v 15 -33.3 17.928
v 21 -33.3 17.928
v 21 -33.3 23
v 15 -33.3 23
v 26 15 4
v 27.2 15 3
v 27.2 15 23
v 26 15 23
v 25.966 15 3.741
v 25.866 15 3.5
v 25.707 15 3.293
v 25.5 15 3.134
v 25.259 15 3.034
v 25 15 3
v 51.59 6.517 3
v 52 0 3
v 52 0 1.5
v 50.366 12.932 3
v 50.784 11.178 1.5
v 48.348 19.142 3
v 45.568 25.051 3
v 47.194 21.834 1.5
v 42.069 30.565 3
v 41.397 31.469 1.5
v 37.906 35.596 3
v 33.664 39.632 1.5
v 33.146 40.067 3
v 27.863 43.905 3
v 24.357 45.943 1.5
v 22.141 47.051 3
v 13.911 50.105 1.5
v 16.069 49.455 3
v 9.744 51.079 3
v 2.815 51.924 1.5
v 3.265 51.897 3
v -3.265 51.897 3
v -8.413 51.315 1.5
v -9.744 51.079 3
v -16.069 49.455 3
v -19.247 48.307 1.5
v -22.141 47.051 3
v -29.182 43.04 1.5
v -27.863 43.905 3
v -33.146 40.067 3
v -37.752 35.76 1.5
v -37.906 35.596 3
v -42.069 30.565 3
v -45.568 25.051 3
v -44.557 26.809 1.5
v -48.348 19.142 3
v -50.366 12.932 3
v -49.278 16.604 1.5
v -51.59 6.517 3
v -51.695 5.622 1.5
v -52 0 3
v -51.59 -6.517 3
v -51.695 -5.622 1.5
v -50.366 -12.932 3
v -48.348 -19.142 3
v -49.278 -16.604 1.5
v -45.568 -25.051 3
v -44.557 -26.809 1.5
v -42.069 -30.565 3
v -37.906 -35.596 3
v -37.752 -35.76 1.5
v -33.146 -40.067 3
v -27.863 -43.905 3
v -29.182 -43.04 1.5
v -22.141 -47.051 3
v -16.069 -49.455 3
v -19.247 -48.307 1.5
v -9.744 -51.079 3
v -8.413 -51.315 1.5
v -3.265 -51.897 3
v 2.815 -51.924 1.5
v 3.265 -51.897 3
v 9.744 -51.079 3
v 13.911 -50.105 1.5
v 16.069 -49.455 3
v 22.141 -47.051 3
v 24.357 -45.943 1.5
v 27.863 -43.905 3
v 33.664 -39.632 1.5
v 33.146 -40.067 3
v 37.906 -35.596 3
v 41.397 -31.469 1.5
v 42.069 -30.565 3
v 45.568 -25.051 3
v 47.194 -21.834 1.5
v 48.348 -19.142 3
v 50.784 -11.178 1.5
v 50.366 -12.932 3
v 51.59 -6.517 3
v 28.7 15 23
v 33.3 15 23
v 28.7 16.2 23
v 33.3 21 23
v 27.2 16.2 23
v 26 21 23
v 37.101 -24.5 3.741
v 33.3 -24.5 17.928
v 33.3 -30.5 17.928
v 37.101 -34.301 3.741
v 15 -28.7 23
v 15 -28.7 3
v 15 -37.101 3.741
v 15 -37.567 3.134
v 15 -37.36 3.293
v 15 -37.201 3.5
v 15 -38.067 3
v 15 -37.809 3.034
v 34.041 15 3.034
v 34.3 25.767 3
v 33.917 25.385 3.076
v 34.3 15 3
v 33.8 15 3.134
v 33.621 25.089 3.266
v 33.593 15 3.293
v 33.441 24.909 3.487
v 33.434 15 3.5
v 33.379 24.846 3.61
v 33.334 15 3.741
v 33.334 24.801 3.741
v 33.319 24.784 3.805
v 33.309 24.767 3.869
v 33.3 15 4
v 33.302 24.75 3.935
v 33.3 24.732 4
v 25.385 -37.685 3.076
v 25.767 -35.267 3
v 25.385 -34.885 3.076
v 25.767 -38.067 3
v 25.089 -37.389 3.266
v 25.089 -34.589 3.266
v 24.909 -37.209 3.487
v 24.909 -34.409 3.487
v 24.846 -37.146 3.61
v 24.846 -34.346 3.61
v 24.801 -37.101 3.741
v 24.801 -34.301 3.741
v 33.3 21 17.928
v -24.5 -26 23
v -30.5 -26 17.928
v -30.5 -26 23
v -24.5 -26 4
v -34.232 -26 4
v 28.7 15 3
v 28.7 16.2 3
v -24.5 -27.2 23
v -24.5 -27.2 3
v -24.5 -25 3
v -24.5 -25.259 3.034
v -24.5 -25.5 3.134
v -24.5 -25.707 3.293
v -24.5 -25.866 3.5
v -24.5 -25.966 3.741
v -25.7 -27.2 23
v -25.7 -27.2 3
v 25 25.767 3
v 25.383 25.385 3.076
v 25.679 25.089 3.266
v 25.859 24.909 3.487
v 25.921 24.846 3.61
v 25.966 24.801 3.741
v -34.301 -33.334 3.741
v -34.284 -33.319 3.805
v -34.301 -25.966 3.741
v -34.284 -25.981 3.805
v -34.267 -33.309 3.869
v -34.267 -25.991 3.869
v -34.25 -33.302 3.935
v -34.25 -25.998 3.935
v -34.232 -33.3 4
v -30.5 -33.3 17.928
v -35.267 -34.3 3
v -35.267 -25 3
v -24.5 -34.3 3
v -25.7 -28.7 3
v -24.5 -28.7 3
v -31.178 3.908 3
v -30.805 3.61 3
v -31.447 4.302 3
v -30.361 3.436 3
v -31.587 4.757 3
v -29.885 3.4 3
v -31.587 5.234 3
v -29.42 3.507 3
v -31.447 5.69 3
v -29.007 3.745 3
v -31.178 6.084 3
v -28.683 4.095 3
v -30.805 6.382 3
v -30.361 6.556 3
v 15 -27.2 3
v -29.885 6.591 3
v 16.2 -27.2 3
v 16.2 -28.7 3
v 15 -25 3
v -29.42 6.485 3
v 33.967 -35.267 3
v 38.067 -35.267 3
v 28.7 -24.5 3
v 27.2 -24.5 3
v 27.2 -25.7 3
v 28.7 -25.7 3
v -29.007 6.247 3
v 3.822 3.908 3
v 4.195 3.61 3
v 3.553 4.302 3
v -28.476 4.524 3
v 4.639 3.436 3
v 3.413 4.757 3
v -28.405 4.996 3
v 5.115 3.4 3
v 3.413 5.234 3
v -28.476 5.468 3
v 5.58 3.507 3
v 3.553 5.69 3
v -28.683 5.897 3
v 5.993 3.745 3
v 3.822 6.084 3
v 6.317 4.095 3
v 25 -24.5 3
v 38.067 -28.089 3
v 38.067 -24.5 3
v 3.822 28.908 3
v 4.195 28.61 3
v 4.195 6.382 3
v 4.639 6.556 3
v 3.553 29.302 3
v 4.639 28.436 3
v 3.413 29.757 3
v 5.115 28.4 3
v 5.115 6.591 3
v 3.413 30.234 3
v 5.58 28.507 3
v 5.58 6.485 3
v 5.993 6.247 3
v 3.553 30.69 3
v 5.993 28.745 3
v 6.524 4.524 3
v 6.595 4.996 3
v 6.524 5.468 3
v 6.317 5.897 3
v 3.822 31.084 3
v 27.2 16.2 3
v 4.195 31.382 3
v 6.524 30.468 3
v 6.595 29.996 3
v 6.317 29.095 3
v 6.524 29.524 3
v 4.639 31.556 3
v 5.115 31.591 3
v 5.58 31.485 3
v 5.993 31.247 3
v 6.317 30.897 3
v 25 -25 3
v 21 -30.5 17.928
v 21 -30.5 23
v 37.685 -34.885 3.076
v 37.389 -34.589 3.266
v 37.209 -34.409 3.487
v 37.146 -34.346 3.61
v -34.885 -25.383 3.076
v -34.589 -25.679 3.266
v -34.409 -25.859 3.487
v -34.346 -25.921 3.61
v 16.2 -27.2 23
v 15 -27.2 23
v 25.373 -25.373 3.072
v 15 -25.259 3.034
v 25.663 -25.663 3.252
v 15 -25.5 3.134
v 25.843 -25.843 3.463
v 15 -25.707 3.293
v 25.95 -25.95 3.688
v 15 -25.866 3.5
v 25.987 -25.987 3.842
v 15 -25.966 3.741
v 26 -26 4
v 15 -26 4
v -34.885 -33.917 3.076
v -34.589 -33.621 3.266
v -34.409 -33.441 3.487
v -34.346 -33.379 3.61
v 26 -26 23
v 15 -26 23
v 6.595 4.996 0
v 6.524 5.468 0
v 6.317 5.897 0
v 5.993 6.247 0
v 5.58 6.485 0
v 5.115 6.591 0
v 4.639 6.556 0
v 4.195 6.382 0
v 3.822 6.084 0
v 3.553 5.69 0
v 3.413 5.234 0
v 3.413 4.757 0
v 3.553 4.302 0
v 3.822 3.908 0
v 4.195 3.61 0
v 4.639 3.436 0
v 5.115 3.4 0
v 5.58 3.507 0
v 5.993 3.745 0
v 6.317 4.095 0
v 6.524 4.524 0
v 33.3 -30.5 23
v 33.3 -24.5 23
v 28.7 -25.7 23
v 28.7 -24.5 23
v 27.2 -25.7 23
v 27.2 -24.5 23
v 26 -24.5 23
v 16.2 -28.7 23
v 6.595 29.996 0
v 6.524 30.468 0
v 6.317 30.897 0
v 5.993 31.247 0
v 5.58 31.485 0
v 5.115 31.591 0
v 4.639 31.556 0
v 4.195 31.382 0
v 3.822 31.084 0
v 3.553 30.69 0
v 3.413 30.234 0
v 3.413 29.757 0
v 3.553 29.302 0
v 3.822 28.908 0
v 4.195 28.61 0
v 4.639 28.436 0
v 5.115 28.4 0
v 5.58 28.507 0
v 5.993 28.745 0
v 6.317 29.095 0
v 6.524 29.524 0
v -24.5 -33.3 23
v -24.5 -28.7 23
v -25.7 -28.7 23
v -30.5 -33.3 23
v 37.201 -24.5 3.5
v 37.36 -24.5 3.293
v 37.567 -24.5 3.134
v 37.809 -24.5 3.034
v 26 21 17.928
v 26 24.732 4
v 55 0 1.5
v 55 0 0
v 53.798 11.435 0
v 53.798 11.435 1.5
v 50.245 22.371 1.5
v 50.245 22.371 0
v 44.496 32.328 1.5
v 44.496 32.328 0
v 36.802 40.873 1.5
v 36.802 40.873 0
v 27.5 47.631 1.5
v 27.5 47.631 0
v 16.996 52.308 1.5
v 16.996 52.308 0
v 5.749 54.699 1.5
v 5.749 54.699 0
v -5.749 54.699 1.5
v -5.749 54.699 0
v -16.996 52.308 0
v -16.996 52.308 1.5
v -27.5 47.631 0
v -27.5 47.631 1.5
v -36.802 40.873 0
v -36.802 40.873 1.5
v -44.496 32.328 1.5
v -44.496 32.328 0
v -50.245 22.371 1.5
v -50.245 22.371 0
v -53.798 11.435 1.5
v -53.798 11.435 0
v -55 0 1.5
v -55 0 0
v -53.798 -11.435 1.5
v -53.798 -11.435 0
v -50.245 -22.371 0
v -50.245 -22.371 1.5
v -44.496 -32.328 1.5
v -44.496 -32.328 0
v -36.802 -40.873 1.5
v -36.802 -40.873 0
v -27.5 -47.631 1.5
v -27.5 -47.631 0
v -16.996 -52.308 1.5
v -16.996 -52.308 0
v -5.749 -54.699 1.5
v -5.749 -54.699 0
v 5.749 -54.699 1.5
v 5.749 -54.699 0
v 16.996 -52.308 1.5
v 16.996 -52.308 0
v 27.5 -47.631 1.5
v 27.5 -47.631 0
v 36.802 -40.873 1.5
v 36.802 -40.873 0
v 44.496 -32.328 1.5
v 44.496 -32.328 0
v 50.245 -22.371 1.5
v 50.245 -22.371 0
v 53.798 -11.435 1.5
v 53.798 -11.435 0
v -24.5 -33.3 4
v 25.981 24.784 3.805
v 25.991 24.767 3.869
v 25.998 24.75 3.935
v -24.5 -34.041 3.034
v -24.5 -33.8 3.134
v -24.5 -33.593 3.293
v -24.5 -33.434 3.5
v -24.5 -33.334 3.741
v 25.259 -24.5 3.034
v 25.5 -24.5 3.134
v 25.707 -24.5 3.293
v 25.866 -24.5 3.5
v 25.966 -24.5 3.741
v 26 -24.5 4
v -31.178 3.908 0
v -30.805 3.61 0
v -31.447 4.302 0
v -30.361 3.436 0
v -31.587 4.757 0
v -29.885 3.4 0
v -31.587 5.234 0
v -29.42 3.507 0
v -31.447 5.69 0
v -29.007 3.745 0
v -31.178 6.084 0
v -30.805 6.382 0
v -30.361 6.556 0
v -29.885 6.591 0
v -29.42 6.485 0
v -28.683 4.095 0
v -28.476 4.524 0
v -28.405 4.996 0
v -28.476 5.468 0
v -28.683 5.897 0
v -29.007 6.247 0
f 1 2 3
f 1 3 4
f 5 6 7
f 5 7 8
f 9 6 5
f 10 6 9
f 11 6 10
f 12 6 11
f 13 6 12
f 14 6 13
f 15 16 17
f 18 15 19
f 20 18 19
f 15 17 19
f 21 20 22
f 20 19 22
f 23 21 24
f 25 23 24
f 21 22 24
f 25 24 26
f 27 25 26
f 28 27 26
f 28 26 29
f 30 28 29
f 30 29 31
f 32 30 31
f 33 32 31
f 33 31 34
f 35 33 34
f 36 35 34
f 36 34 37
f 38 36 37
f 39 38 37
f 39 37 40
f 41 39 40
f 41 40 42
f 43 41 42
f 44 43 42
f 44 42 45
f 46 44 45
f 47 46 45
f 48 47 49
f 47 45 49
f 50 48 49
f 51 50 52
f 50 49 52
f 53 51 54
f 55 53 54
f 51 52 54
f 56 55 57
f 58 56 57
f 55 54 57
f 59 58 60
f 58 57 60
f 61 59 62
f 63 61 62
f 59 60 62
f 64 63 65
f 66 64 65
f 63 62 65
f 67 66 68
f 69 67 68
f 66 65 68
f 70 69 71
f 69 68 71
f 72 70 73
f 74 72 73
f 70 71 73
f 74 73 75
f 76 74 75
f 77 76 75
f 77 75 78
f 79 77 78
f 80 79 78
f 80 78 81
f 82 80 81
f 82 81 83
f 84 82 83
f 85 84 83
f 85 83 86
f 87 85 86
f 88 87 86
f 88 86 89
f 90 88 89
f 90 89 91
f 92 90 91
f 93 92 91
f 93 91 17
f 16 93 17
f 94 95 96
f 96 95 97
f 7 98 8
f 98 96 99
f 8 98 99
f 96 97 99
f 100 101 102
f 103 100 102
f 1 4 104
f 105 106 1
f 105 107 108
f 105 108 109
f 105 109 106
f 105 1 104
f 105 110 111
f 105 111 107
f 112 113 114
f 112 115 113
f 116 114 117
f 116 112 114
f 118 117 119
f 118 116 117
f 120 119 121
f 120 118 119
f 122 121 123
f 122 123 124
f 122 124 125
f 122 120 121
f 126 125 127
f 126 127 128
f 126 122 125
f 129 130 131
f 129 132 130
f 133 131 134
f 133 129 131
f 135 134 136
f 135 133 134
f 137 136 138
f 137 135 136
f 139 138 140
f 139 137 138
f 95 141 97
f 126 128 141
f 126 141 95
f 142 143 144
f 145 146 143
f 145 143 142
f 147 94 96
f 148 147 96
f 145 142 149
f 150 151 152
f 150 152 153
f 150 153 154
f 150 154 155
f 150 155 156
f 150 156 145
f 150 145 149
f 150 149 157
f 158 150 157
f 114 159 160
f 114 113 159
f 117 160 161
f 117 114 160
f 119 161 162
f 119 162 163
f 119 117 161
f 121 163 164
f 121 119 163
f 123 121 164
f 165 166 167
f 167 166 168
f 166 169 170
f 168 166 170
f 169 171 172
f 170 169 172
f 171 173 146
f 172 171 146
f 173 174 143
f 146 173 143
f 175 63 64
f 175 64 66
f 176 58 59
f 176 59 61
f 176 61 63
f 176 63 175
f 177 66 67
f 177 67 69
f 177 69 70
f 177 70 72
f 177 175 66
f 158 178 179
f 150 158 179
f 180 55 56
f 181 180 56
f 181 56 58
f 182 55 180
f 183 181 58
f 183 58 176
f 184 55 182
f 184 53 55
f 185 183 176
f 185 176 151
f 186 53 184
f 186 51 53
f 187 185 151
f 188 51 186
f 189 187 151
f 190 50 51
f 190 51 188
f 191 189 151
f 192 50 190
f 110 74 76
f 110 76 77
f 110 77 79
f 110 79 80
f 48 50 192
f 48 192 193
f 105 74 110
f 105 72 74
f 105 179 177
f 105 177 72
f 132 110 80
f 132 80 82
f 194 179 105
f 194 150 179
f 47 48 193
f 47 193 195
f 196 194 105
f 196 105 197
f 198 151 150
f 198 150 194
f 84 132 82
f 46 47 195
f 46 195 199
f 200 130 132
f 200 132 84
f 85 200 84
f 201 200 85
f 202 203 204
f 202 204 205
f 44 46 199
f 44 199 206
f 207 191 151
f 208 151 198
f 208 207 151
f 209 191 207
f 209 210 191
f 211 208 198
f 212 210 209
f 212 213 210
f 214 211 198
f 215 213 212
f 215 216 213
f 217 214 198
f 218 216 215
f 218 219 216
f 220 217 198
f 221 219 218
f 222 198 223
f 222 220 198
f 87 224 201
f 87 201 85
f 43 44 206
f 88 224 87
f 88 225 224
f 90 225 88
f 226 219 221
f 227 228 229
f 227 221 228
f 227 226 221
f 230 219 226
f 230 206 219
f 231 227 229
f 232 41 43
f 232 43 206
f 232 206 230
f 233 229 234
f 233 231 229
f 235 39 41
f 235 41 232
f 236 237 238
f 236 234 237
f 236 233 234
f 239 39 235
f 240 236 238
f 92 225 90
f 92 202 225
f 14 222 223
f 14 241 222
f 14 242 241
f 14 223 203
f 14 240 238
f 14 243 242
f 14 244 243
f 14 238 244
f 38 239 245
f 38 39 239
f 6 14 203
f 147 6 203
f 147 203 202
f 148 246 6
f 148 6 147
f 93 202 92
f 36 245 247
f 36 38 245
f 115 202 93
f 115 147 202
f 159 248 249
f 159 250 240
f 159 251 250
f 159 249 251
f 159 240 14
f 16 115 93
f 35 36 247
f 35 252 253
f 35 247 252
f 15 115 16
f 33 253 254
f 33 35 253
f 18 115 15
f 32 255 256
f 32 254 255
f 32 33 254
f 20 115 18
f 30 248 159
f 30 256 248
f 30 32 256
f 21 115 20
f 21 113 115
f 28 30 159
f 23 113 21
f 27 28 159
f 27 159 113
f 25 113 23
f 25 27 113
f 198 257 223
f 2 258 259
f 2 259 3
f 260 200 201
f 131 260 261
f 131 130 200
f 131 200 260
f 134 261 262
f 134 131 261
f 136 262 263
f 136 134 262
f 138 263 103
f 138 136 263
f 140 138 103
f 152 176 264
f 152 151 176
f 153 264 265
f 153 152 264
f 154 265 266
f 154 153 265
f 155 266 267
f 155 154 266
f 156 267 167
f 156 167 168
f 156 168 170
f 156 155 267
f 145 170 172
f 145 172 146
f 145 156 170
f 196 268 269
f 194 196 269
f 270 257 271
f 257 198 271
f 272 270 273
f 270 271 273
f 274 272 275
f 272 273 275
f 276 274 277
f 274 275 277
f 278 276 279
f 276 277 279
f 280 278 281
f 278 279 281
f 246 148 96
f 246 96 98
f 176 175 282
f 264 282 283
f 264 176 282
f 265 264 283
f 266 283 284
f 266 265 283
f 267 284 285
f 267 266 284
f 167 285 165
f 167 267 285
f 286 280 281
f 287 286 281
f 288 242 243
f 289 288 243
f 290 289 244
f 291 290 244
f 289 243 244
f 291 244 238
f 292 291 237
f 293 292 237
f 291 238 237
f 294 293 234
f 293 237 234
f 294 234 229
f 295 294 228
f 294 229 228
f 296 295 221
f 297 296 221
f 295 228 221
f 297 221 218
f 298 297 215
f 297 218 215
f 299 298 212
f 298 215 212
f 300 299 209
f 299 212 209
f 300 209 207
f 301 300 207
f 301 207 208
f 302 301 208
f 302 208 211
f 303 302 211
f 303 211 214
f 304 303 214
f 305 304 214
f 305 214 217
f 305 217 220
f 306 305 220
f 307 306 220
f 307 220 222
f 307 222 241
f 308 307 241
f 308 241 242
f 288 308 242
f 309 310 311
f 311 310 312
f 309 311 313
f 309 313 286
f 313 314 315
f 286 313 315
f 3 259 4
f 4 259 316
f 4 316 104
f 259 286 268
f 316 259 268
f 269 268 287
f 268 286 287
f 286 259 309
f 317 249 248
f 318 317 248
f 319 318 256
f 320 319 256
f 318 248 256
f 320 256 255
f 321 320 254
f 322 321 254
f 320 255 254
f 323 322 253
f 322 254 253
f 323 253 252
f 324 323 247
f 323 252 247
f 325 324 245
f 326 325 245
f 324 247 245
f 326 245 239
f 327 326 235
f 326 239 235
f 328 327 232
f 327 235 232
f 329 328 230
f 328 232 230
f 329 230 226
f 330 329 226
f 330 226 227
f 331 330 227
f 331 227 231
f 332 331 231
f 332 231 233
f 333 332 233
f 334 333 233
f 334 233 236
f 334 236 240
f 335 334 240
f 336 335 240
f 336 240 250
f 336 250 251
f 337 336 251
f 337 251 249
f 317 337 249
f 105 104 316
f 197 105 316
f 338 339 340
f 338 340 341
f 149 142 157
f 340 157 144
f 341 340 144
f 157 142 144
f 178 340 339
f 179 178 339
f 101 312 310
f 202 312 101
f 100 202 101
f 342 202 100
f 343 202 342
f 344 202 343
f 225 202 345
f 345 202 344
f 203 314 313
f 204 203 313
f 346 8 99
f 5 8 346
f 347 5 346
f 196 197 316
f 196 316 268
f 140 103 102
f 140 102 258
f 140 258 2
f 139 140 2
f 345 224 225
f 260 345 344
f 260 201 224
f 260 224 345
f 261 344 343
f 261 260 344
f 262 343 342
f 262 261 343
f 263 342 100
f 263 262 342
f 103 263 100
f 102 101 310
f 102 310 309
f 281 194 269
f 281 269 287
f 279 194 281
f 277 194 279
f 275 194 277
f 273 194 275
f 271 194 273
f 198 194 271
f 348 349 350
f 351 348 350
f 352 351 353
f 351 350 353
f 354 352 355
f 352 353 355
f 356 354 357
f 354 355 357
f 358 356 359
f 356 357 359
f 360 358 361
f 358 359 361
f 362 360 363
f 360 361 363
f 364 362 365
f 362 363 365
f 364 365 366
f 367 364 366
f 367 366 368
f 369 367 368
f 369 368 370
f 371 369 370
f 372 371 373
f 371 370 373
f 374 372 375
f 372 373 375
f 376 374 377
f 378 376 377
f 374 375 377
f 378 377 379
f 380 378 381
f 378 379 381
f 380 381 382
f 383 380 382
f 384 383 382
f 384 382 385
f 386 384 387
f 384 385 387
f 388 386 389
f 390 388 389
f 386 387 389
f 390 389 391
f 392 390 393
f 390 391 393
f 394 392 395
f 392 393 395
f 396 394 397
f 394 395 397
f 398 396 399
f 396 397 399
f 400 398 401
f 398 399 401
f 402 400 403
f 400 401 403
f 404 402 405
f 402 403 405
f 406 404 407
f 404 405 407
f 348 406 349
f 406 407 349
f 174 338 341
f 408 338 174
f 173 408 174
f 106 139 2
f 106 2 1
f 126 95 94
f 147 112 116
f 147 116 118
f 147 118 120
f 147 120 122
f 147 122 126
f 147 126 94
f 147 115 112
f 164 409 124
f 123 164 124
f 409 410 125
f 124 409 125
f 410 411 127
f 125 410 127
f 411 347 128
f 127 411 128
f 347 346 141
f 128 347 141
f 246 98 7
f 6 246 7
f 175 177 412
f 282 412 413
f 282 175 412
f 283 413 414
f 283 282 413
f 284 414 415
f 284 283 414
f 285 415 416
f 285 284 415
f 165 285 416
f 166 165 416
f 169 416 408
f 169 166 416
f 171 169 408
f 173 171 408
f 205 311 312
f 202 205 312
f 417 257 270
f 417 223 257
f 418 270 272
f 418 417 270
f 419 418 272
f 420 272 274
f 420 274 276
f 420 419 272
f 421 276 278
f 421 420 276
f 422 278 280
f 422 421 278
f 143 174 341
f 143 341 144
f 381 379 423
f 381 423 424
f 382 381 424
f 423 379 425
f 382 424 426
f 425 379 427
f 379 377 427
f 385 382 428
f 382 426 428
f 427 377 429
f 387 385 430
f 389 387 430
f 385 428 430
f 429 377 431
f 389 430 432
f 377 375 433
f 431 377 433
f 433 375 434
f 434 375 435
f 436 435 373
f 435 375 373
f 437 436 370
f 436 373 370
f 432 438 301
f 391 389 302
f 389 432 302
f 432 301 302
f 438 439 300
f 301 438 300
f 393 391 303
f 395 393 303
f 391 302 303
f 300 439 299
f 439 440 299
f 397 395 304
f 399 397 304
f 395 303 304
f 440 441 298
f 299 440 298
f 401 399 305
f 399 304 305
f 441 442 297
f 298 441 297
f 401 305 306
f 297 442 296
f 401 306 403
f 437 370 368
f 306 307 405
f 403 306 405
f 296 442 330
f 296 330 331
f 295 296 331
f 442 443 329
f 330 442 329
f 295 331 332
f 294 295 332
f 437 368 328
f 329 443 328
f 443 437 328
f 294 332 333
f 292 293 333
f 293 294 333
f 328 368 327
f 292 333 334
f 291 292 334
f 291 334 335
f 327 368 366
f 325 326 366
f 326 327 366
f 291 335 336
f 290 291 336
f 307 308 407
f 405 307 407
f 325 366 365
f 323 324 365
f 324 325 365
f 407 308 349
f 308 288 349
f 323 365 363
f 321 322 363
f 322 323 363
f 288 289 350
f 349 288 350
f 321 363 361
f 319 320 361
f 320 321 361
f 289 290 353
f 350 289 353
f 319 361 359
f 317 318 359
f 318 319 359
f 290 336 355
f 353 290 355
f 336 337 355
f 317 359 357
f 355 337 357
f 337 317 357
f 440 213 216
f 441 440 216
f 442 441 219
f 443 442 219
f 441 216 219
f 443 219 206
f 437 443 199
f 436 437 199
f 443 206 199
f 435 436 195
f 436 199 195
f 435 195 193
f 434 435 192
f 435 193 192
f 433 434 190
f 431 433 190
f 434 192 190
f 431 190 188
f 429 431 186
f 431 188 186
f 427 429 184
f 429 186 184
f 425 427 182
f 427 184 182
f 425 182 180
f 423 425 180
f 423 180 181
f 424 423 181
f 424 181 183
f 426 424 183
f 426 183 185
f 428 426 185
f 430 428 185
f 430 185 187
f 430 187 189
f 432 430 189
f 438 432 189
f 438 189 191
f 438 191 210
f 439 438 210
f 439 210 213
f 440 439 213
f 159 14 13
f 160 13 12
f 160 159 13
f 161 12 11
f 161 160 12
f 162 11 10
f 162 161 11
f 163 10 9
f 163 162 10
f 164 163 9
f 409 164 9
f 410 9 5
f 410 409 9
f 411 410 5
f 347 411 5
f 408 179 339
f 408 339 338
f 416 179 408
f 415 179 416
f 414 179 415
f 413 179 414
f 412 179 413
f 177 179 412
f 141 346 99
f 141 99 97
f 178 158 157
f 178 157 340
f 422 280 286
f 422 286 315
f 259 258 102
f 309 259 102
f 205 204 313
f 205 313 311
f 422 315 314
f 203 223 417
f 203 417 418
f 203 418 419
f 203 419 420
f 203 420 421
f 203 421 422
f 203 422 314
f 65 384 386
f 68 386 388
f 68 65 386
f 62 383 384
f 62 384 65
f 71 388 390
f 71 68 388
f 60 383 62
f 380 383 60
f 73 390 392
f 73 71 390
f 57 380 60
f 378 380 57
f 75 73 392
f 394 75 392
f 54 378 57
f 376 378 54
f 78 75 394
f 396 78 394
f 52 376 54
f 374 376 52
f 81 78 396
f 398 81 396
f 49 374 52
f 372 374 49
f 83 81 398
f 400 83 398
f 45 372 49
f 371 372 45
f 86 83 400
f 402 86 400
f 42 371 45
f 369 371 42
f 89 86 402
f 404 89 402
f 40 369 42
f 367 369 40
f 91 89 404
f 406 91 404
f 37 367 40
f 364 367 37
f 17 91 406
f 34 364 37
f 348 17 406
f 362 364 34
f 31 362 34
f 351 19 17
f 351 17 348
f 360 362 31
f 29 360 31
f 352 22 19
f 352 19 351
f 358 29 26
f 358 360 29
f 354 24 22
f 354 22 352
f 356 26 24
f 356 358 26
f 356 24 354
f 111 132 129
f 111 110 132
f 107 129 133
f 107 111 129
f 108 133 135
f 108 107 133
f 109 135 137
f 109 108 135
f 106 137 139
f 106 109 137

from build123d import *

# Parameters (mm, degrees)
SKIZZE1_R                       = 52
AUFSATZ_LINEAR_AUSTRAGEN1_DEPTH = 3
SKIZZE1_3_R                     = 55
SKIZZE1_3_R_2                   = 52
AUFSATZ_LINEAR_AUSTRAGEN2_DEPTH = 1.5
AUFSATZ_LINEAR_AUSTRAGEN5_DEPTH = 20
FASE2_SIZE                      = 4
FASE2_SIZE2                     = 14.92820323
FASE3_SIZE                      = 4
FASE3_SIZE2                     = 14.92820323
VERRUNDUNG1_R                   = 1
SCHNITT_LINEAR_AUSTRAGEN1_REACH = 82.312
SKIZZE3_R                       = 1.6


with BuildPart() as part:
    # Skizze1 → Aufsatz-Linear austragen1 (new body)
    with BuildSketch(Plane.XY):
        Circle(SKIZZE1_R)
    extrude(amount=AUFSATZ_LINEAR_AUSTRAGEN1_DEPTH)

    # Skizze1<3> → Aufsatz-Linear austragen2 (add)
    with BuildSketch(Plane.XY):
        Circle(SKIZZE1_3_R)
        Circle(SKIZZE1_3_R_2, mode=Mode.SUBTRACT)
    extrude(amount=AUFSATZ_LINEAR_AUSTRAGEN2_DEPTH)

    # Skizze2 → Aufsatz-Linear austragen5 (add)
    with BuildSketch(Plane.XY.offset(3)):
        Polygon((26, 21), (26, 15), (27.2, 15), (27.2, 16.2), (28.7, 16.2), (28.7, 15), (33.3, 15), (33.3, 21), align=None)
        Polygon((33.3, -30.5), (33.3, -24.5), (28.7, -24.5), (28.7, -25.7), (27.2, -25.7), (27.2, -24.5), (26, -24.5), (26, -26), (15, -26), (15, -27.2), (16.2, -27.2), (16.2, -28.7), (15, -28.7), (15, -33.3), (21, -33.3), (21, -30.5), align=None)
        Polygon((-30.5, -26), (-30.5, -33.3), (-24.5, -33.3), (-24.5, -28.7), (-25.7, -28.7), (-25.7, -27.2), (-24.5, -27.2), (-24.5, -26), align=None)
    extrude(amount=AUFSATZ_LINEAR_AUSTRAGEN5_DEPTH)

    # Fase2
    fase2_edges = [part.edges().sort_by_distance(p)[0] for p in [
        (33.3, -27.5, 3),
        (18, -33.3, 3),
        (29.65, 21, 3),
        (-30.5, -29.65, 3),
    ]]
    fase2_side = [part.faces().sort_by_distance(p)[0] for p in [
        (-0.31627578, 0.425239539, 3),
    ]]
    chamfer(fase2_edges, length=FASE2_SIZE, length2=FASE2_SIZE2, reference=fase2_side[0])

    # Fase3
    fase3_edges = [part.edges().sort_by_distance(p)[0] for p in [
        (29.15, -30.5, 3),
        (21, -33.9, 3),
    ]]
    fase3_side = [part.faces().sort_by_distance(p)[0] for p in [
        (-0.466268066, 0.638295482, 3),
    ]]
    chamfer(fase3_edges, length=FASE3_SIZE, length2=FASE3_SIZE2, reference=fase3_side[0])

    # Verrundung1
    verrundung1_edges = [part.edges().sort_by_distance(p)[0] for p in [
        (26, 20, 3),
        (29.65, 25, 3),
        (33.3, 20, 3),
        (-29.5, -33.3, 3),
        (-34.5, -29.65, 3),
        (-29.5, -26, 3),
        (26, -25.25, 3),
        (20.5, -26, 3),
        (37.3, -29.5, 3),
        (31.15, -34.5, 3),
        (25, -35.9, 3),
        (20, -37.3, 3),
    ]]
    fillet(verrundung1_edges, radius=VERRUNDUNG1_R)

    # Skizze3 → Schnitt-Linear austragen1 (cut, up to next)
    with BuildSketch(Plane.XY.offset(3), mode=Mode.PRIVATE) as schnitt_linear_austragen1_sk1:
        with Locations((4.995000167, 4.995918163)):
            Circle(SKIZZE3_R)
    schnitt_linear_austragen1_tool1 = extrude(schnitt_linear_austragen1_sk1.sketch, amount=-SCHNITT_LINEAR_AUSTRAGEN1_REACH, mode=Mode.PRIVATE) & part.part
    # Skizze3 → Schnitt-Linear austragen1 (cut, up to next)
    with BuildSketch(Plane.XY.offset(3), mode=Mode.PRIVATE) as schnitt_linear_austragen1_sk2:
        with Locations((4.995000167, 29.995918163)):
            Circle(SKIZZE3_R)
    schnitt_linear_austragen1_tool2 = extrude(schnitt_linear_austragen1_sk2.sketch, amount=-SCHNITT_LINEAR_AUSTRAGEN1_REACH, mode=Mode.PRIVATE) & part.part
    # Skizze3 → Schnitt-Linear austragen1 (cut, up to next)
    with BuildSketch(Plane.XY.offset(3), mode=Mode.PRIVATE) as schnitt_linear_austragen1_sk3:
        with Locations((-30.004999833, 4.995918163)):
            Circle(SKIZZE3_R)
    schnitt_linear_austragen1_tool3 = extrude(schnitt_linear_austragen1_sk3.sketch, amount=-SCHNITT_LINEAR_AUSTRAGEN1_REACH, mode=Mode.PRIVATE) & part.part
    add(schnitt_linear_austragen1_tool1.solids().sort_by_distance((4.995, 4.995918, 3))[0], mode=Mode.SUBTRACT)
    add(schnitt_linear_austragen1_tool2.solids().sort_by_distance((4.995, 29.995918, 3))[0], mode=Mode.SUBTRACT)
    add(schnitt_linear_austragen1_tool3.solids().sort_by_distance((-30.005, 4.995918, 3))[0], mode=Mode.SUBTRACT)


solid = part.part
